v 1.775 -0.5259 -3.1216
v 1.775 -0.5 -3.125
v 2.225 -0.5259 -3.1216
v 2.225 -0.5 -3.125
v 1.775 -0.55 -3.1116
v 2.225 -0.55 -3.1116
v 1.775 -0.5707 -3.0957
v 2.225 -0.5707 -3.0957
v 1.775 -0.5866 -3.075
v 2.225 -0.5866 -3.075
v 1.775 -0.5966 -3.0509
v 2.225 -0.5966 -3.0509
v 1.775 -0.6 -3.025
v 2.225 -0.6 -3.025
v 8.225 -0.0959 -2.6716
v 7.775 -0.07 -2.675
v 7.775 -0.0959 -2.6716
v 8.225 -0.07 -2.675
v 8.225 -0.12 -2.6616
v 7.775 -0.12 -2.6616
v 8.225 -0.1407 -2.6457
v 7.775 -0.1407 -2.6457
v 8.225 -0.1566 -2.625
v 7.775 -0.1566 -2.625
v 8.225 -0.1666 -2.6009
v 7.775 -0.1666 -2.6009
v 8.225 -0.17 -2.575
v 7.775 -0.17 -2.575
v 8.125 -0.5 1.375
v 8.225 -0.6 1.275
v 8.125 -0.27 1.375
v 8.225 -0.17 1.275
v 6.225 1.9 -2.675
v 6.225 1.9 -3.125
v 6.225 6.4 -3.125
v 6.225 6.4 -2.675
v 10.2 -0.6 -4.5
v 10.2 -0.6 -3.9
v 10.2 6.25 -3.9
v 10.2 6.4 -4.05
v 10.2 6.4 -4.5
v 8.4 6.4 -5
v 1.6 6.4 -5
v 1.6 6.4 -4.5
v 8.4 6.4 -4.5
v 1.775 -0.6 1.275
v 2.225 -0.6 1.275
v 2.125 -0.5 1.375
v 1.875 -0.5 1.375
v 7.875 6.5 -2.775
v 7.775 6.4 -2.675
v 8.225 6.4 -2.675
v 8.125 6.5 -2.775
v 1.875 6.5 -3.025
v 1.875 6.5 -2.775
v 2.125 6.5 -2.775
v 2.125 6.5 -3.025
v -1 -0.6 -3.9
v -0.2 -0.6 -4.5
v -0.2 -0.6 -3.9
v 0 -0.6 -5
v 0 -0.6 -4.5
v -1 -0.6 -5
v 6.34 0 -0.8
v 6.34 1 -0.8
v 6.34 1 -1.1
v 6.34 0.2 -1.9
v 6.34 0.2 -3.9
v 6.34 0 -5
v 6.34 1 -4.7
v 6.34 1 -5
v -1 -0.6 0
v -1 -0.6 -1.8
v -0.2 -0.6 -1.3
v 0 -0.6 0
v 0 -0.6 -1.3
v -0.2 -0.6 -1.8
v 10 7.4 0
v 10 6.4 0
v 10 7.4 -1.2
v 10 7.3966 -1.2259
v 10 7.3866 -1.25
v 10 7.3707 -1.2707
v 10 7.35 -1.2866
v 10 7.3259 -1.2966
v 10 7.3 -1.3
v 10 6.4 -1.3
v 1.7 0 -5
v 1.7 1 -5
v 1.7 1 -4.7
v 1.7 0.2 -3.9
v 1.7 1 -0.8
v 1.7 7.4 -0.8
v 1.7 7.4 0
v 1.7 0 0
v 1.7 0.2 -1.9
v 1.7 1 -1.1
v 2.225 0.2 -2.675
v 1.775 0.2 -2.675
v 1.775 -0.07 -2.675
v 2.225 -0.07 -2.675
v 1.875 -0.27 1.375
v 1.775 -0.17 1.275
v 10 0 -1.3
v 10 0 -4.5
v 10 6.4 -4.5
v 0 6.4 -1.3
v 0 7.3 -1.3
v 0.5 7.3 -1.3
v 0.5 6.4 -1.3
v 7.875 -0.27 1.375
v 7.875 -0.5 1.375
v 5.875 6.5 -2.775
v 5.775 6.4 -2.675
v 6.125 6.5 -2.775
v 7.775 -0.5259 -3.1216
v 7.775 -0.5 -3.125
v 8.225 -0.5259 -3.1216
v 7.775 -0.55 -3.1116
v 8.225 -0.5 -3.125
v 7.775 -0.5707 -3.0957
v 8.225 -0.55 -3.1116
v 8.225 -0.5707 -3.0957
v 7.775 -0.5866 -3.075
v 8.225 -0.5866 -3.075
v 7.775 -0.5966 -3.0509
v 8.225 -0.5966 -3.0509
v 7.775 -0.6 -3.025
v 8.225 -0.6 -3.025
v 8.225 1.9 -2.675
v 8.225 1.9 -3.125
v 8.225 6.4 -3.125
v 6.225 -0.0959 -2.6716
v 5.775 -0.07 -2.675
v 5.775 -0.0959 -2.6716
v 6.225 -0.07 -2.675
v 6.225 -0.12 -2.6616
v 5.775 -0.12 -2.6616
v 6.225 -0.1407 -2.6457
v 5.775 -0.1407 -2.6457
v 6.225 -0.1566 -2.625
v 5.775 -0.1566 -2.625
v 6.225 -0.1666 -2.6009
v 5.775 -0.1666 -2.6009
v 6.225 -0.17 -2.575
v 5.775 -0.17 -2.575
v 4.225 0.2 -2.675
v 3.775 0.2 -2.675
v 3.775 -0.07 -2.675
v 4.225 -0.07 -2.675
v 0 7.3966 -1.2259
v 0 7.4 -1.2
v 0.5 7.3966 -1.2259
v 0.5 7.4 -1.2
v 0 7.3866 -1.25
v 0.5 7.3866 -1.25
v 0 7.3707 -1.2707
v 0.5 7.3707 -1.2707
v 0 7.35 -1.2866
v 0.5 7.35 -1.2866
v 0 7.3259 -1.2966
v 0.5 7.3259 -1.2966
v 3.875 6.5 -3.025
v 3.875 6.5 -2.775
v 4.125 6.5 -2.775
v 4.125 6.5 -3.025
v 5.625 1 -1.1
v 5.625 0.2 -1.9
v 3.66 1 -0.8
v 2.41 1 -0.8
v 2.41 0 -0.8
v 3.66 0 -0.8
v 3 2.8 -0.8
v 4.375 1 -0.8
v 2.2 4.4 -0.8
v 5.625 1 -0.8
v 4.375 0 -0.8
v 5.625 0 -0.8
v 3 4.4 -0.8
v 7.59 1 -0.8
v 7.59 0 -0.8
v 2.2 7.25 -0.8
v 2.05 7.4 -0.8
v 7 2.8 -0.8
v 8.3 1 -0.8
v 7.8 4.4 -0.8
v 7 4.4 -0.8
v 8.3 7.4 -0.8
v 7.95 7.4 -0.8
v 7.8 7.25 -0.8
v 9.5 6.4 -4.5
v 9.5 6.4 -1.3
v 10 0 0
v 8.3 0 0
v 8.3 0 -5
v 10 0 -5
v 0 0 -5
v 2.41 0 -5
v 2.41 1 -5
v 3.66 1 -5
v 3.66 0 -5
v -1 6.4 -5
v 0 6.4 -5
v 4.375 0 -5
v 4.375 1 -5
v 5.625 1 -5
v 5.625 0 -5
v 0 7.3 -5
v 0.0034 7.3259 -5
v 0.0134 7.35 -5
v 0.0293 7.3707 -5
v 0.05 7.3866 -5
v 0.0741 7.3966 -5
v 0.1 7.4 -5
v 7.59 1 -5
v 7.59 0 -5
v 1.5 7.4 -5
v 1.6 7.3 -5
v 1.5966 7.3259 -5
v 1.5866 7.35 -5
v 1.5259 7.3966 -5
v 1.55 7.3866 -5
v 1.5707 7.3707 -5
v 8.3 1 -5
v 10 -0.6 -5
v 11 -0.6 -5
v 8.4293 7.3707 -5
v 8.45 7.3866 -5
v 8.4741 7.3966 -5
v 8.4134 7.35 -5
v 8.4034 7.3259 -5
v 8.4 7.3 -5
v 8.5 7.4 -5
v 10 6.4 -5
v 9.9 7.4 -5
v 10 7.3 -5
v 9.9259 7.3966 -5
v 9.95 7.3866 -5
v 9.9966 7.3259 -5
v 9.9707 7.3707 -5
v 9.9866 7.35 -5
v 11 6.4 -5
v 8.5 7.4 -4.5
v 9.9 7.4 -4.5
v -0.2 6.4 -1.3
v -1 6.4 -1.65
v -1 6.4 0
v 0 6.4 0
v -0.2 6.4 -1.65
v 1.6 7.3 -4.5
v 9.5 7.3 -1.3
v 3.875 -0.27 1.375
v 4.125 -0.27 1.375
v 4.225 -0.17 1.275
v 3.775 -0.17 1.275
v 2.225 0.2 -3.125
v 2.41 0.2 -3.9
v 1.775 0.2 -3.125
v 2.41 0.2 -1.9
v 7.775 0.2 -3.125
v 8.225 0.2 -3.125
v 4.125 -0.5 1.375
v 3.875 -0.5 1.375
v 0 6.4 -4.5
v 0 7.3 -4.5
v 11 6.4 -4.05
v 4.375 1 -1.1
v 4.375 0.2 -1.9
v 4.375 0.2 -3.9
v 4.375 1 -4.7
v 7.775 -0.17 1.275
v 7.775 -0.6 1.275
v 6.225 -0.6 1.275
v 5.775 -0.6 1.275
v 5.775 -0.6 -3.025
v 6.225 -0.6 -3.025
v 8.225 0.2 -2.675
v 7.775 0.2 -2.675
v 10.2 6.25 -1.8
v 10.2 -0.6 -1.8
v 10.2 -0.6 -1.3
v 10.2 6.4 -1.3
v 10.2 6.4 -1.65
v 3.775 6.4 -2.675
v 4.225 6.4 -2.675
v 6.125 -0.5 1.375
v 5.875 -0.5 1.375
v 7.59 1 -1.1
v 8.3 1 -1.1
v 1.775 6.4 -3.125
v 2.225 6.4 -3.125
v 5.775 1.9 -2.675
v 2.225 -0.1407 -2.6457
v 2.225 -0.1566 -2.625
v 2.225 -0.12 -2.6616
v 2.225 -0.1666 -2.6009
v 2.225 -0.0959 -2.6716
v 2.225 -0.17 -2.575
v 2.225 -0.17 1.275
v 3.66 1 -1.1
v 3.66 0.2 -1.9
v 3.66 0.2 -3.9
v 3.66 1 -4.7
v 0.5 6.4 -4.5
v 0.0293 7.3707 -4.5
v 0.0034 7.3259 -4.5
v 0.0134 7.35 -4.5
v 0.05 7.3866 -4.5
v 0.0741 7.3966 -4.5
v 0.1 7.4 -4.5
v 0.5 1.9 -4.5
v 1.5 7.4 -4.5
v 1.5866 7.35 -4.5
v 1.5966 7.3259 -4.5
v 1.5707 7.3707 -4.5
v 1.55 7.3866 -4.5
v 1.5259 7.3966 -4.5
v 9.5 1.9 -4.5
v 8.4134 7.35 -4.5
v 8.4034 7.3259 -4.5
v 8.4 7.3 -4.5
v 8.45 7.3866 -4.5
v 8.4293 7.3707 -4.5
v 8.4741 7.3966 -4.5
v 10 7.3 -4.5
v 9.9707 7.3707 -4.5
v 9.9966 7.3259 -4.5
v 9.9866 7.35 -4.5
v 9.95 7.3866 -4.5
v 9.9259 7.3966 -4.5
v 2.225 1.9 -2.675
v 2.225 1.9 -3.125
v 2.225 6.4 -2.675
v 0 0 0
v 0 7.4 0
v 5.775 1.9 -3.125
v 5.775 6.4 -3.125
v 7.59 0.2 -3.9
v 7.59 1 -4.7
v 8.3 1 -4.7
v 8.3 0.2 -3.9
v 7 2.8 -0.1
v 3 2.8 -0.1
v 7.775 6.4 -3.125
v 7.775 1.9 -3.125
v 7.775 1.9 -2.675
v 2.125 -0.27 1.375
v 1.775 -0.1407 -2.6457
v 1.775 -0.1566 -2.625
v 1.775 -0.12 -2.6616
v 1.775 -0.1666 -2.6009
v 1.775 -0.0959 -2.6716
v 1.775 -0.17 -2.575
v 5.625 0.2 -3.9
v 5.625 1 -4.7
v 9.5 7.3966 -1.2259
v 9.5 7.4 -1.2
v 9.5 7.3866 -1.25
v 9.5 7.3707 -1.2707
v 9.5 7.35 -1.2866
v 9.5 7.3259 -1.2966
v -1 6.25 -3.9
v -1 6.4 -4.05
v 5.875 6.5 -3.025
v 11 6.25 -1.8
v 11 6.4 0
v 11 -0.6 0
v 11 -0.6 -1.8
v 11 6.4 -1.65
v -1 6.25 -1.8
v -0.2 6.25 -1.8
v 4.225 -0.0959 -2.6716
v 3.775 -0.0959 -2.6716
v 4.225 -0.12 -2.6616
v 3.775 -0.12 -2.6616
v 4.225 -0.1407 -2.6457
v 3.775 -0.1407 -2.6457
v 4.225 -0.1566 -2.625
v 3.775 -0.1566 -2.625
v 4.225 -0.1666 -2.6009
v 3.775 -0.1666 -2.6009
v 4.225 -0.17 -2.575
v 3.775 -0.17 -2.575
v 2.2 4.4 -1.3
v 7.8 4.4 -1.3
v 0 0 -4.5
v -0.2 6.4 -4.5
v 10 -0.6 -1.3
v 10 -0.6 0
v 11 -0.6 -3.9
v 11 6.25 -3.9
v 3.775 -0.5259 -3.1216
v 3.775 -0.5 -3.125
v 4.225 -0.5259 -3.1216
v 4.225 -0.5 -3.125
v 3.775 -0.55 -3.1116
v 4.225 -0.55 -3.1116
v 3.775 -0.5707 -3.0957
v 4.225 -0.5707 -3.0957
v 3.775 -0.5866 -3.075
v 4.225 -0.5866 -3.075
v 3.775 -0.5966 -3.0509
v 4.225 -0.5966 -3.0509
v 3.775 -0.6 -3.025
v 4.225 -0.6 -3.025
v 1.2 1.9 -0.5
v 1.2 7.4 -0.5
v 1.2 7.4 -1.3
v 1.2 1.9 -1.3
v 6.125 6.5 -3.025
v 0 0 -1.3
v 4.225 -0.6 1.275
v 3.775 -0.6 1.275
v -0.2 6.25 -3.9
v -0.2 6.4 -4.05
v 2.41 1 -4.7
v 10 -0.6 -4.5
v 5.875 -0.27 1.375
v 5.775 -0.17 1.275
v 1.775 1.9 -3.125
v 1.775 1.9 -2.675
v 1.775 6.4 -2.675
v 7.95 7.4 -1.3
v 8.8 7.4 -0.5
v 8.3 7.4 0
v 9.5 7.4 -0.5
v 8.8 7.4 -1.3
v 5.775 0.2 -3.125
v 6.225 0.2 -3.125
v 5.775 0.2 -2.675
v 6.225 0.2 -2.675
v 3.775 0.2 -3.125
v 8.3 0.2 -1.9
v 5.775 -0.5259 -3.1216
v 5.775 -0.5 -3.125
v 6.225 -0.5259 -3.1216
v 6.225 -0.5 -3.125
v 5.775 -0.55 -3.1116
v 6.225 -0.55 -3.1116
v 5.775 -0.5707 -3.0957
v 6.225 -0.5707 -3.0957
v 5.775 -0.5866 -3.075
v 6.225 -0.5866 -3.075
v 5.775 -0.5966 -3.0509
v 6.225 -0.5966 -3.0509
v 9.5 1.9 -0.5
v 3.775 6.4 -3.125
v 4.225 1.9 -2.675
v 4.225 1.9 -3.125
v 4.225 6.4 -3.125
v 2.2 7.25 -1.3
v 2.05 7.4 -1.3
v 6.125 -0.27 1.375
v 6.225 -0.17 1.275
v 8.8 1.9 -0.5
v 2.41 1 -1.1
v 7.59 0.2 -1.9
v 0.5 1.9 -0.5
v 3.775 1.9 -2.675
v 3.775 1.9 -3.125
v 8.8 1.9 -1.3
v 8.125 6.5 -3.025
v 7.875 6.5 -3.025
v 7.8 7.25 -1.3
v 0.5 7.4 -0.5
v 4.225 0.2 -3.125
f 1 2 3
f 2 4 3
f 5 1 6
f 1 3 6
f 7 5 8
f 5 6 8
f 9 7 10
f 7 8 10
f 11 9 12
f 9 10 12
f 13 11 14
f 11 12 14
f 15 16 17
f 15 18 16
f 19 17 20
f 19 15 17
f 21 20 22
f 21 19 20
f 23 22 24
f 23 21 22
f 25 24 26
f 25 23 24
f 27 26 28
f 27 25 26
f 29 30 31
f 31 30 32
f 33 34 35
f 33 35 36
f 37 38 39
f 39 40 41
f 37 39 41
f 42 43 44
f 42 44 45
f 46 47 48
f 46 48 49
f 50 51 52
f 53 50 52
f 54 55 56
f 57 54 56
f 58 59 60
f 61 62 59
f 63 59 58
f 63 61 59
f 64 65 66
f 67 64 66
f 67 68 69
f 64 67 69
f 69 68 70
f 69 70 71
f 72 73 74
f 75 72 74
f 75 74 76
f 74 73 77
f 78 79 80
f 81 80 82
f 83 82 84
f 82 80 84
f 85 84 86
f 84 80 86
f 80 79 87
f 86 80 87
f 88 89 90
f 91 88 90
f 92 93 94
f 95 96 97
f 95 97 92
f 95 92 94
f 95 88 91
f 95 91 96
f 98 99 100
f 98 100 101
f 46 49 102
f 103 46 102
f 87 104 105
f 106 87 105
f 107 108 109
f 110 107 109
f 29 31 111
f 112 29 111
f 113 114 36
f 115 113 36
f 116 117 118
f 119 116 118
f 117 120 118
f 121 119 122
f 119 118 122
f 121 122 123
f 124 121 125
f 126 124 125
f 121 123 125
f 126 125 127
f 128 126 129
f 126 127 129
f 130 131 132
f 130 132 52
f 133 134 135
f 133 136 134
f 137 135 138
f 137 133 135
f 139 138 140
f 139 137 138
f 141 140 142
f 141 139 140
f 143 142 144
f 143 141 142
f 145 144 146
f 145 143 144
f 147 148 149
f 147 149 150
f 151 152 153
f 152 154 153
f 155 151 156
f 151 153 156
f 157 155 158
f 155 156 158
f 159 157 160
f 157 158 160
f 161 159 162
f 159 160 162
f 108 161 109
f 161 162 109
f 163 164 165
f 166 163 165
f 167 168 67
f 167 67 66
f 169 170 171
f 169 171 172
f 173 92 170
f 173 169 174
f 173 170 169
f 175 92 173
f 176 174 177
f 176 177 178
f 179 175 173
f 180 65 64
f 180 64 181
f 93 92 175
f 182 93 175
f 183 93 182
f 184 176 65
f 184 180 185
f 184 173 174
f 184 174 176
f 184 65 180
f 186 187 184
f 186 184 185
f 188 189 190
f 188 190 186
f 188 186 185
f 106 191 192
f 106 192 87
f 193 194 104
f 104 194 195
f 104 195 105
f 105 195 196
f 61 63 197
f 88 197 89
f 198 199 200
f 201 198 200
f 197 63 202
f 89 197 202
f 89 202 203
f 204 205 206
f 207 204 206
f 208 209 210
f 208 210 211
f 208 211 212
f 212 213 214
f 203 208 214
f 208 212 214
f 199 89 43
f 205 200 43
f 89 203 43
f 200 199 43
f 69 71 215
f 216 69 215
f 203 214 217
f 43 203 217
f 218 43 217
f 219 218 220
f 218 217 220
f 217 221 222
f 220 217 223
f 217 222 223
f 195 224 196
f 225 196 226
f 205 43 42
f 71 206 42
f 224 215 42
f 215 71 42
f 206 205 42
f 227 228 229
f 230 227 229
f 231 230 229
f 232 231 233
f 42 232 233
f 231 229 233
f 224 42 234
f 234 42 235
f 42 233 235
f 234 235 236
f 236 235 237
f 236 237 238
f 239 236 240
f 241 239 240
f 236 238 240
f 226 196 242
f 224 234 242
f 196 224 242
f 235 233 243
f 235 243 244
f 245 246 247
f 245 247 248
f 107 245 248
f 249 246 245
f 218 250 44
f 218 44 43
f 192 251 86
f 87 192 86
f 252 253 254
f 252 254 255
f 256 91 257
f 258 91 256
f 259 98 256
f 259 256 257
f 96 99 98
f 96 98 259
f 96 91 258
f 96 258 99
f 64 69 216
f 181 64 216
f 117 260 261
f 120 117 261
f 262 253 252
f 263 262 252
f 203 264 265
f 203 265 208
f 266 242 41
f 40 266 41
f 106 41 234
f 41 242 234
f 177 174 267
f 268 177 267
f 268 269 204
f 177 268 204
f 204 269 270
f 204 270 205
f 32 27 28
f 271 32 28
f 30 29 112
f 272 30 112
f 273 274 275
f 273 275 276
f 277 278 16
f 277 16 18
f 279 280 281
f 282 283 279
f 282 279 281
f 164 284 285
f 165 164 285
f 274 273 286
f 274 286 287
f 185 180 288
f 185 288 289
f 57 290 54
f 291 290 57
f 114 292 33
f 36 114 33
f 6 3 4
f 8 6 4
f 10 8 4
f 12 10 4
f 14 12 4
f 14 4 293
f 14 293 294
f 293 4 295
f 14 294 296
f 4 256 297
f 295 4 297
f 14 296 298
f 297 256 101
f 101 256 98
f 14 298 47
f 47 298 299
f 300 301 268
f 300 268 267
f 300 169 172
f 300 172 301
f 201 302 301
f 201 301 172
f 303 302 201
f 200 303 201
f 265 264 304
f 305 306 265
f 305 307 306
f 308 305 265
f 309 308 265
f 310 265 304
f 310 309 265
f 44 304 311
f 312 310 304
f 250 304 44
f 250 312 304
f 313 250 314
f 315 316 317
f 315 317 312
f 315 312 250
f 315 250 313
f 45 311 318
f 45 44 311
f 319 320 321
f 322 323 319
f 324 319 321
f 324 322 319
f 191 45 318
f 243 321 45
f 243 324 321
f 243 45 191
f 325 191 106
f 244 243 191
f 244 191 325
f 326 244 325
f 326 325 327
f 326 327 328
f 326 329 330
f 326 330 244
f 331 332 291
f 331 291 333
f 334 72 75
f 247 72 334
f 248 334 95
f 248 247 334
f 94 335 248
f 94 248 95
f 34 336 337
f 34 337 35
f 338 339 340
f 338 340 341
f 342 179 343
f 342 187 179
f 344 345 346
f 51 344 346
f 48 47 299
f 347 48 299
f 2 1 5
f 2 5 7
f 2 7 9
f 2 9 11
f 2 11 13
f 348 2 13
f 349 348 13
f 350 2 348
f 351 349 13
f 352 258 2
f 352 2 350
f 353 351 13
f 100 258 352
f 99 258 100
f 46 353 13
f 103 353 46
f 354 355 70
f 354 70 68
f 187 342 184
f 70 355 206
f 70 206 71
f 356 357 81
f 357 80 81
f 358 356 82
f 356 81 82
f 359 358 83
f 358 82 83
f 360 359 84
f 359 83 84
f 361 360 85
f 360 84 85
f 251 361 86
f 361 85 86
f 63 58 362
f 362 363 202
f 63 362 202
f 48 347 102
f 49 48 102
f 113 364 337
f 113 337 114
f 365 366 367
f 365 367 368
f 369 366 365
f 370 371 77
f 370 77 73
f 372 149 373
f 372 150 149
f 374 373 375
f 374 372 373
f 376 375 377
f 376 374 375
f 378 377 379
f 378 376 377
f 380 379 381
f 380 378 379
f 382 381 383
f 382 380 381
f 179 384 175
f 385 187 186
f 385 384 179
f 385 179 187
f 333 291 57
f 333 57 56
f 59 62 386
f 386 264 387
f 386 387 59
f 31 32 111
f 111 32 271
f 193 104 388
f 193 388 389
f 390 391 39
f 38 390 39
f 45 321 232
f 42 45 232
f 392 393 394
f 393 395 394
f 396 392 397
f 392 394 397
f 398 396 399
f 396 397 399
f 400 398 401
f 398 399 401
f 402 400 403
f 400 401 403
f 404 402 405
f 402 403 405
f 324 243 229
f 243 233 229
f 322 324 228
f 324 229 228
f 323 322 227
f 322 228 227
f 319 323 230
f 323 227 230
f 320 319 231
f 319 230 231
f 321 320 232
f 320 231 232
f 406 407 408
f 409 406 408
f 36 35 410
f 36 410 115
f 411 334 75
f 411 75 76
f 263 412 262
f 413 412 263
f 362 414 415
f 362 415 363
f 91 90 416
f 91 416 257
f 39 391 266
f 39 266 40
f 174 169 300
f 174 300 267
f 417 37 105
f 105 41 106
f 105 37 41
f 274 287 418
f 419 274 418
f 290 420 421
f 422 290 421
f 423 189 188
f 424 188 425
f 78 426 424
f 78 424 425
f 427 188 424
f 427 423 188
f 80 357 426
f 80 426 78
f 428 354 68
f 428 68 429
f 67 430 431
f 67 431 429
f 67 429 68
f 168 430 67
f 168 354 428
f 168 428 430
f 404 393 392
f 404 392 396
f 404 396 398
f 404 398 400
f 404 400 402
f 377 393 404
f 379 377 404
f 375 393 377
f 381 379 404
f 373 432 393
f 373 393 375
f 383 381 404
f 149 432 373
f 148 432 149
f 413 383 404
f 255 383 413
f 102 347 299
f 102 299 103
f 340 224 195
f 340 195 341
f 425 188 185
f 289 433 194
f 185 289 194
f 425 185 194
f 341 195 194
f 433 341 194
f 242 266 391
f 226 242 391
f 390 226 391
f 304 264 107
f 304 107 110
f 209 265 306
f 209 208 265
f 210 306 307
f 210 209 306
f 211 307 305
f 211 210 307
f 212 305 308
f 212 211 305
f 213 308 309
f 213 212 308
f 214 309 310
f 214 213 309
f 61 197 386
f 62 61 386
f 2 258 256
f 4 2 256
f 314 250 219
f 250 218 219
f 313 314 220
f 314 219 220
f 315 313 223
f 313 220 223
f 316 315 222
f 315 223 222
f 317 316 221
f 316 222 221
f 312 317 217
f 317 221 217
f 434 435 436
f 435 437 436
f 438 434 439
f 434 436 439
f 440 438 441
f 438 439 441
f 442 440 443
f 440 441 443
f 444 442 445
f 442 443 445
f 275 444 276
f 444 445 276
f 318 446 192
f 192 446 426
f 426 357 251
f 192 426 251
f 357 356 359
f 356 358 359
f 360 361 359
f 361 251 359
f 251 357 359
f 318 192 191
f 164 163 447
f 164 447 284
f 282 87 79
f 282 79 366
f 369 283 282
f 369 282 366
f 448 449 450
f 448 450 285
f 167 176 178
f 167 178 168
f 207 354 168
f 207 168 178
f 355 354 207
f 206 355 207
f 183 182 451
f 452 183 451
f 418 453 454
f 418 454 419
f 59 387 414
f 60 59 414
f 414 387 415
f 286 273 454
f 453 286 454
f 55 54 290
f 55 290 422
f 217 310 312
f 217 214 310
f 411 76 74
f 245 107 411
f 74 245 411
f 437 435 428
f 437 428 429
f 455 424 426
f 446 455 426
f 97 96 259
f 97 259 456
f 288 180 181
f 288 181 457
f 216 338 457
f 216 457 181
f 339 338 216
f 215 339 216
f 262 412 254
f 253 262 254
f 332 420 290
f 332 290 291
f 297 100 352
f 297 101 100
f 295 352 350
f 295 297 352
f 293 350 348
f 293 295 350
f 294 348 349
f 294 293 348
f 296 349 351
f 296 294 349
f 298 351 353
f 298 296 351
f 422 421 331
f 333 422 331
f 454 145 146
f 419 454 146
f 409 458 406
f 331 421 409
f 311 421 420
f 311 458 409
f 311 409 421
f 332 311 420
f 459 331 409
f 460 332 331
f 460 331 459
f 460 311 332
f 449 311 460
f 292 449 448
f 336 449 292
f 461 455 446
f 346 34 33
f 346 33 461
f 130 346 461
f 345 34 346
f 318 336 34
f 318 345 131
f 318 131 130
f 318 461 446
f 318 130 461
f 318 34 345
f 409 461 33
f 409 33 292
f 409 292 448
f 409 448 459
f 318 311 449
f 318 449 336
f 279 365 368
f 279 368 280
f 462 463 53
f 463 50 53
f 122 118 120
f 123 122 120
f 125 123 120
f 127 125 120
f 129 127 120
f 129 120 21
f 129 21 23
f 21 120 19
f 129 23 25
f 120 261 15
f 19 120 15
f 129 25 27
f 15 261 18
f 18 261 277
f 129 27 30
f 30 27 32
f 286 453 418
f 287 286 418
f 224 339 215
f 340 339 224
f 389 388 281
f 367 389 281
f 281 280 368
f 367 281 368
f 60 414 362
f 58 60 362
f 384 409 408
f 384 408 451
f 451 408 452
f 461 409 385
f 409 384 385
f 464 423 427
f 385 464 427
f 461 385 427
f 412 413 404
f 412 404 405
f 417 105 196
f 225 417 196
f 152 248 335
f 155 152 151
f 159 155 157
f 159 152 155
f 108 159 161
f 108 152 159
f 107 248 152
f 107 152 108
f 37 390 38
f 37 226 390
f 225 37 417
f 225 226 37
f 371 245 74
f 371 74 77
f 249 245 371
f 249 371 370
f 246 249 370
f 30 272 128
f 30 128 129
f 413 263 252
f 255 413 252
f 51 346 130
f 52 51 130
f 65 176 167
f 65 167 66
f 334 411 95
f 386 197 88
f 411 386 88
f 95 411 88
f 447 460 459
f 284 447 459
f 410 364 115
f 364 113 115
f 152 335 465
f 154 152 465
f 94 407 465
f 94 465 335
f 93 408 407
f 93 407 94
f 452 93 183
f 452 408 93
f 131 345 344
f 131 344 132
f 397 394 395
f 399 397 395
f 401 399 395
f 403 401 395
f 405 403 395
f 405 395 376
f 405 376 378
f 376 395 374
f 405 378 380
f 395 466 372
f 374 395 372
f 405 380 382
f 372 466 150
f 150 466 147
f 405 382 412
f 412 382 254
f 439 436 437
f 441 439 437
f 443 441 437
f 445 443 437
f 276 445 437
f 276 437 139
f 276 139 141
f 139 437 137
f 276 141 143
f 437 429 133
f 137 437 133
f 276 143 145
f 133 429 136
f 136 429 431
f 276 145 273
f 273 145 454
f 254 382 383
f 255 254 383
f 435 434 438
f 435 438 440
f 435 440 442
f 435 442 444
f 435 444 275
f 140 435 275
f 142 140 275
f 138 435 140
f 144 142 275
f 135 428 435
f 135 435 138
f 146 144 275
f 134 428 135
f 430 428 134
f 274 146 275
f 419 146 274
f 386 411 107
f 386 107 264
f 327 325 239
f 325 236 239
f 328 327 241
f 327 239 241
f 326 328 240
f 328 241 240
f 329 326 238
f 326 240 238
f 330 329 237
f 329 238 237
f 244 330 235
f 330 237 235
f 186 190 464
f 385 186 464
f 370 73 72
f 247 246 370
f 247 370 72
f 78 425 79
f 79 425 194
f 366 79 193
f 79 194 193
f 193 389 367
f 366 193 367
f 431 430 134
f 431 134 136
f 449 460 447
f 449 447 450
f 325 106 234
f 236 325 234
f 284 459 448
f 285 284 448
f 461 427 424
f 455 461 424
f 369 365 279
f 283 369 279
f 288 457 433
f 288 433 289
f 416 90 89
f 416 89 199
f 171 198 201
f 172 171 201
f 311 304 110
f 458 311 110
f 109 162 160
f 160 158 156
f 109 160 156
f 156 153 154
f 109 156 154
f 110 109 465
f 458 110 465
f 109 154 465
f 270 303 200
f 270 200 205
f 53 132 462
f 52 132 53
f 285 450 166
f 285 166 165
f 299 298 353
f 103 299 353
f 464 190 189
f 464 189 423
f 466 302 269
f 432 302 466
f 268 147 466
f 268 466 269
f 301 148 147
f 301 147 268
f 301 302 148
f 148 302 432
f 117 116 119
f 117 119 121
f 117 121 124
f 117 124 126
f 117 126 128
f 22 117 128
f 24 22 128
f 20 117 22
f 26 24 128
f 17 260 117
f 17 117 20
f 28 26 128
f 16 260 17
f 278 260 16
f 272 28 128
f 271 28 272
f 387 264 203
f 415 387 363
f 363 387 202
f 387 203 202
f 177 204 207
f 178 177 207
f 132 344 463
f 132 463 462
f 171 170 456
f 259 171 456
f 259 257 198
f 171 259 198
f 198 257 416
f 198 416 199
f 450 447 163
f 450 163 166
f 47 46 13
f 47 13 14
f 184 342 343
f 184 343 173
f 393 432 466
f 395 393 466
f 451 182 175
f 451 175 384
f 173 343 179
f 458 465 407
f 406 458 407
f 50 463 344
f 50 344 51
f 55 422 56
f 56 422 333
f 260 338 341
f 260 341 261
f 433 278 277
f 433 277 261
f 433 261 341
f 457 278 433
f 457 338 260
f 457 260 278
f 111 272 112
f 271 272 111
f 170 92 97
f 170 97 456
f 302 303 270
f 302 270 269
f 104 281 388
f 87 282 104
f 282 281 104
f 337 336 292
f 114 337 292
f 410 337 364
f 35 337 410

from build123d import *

# Parameters (mm, degrees)
ESQUISSE1_W             = 10
ESQUISSE1_H             = 5
BOSS_EXTRU_1_DEPTH      = 7.4
ESQUISSE2_W             = 6.6
ESQUISSE2_H             = 0.8
ENL_V_MAT_EXTRU_1_DEPTH = 8
ENL_V_MAT_EXTRU_2_DEPTH = 5.5
ESQUISSE5_W             = 6.8
ESQUISSE5_H             = 0.5
ESQUISSE5_W_2           = 0.5
ESQUISSE5_H_2           = 3.2
ENL_V_MAT_EXTRU_3_DEPTH = 1
ESQUISSE6_W             = 5.6
ESQUISSE6_H             = 0.5
ENL_V_MAT_EXTRU_4_DEPTH = 3
ESQUISSE8_W             = 6.6
ESQUISSE8_H             = 4.2
ENL_V_MAT_EXTRU_6_DEPTH = 1
BOSS_EXTRU_2_DEPTH      = 6.8
BOSS_EXTRU_3_DEPTH      = 2
BOSS_EXTRU_3_DEPTH_BACK = 2
ESQUISSE17_W            = 1.25
ESQUISSE17_H            = 4.2
BOSS_EXTRU_8_DEPTH      = 1
CHANFREIN1_SIZE         = 0.15
ESQUISSE13_W            = 0.45
ESQUISSE13_H            = 0.45
BOSS_EXTRU_5_DEPTH      = 0.8
BOSS_EXTRU_5_DEPTH_BACK = 6.3
CONG_2_R                = 0.1
ESQUISSE14_W            = 0.45
ESQUISSE14_H            = 0.43
BOSS_EXTRU_6_DEPTH      = 4.5
CHANFREIN2_SIZE         = 0.1
BOSS_EXTRU_7_DEPTH      = 7
CHANFREIN4_SIZE         = 0.15
CONG_3_R                = 0.1


with BuildPart() as part:
    # Esquisse1 → Boss.-Extru.1 (new body)
    with BuildSketch(Plane(origin=(0, 0, 0), x_dir=(1, 0, 0), z_dir=(0, 1, 0))):
        with Locations((5, 2.5)):
            Rectangle(ESQUISSE1_W, ESQUISSE1_H)
    extrude(amount=BOSS_EXTRU_1_DEPTH)

    # Esquisse2 → Enlèv. mat.-Extru.1 (cut)
    with BuildSketch(Plane(origin=(0, 7.4, 0), x_dir=(1, 0, 0), z_dir=(0, 1, 0))):
        with Locations((5, 0.4)):
            Rectangle(ESQUISSE2_W, ESQUISSE2_H)
    extrude(amount=-ENL_V_MAT_EXTRU_1_DEPTH, mode=Mode.SUBTRACT)

    # Esquisse4 → Enlèv. mat.-Extru.2 (cut)
    with BuildSketch(Plane(origin=(0, 7.4, 0), x_dir=(1, 0, 0), z_dir=(0, 1, 0))):
        Polygon((0.5, 0.5), (1.2, 0.5), (1.2, 1.3), (8.8, 1.3), (8.8, 0.5), (9.5, 0.5), (9.5, 4.5), (0.5, 4.5), align=None)
    extrude(amount=-ENL_V_MAT_EXTRU_2_DEPTH, mode=Mode.SUBTRACT)

    # Esquisse5 → Enlèv. mat.-Extru.3 (cut)
    with BuildSketch(Plane(origin=(0, 7.4, 0), x_dir=(1, 0, 0), z_dir=(0, 1, 0))):
        with Locations((5, 4.75)):
            Rectangle(ESQUISSE5_W, ESQUISSE5_H)
        with Locations((0.25, 2.9)):
            Rectangle(ESQUISSE5_W_2, ESQUISSE5_H_2)
        with Locations((9.75, 2.9)):
            Rectangle(ESQUISSE5_W_2, ESQUISSE5_H_2)
    extrude(amount=-ENL_V_MAT_EXTRU_3_DEPTH, mode=Mode.SUBTRACT)

    # Esquisse6 → Enlèv. mat.-Extru.4 (cut)
    with BuildSketch(Plane(origin=(0, 7.4, 0), x_dir=(1, 0, 0), z_dir=(0, 1, 0))):
        with Locations((5, 1.05)):
            Rectangle(ESQUISSE6_W, ESQUISSE6_H)
    extrude(amount=-ENL_V_MAT_EXTRU_4_DEPTH, mode=Mode.SUBTRACT)

    # Esquisse8 → Enlèv. mat.-Extru.6 (cut)
    with BuildSketch(Plane.XZ):
        with Locations((5, -2.9)):
            Rectangle(ESQUISSE8_W, ESQUISSE8_H)
    extrude(amount=-ENL_V_MAT_EXTRU_6_DEPTH, mode=Mode.SUBTRACT)

    # Esquisse9 → Boss.-Extru.2 (add)
    with BuildSketch(Plane(origin=(1.7, 0, 0), x_dir=(0, 0, -1), z_dir=(1, 0, 0))):
        Polygon((4.7, 1), (3.9, 0.2), (1.9, 0.2), (1.1, 1), align=None)
    extrude(amount=BOSS_EXTRU_2_DEPTH)

    # Esquisse11 → Boss.-Extru.3 (add, two sides)
    with BuildSketch(Plane(origin=(5, 0, 0), x_dir=(0, 0, -1), z_dir=(1, 0, 0))) as boss_extru_3_sk:
        Polygon((0.8, 4.4), (0.1, 2.8), (0.8, 2.8), align=None)
    extrude(amount=BOSS_EXTRU_3_DEPTH)
    extrude(boss_extru_3_sk.sketch, amount=-BOSS_EXTRU_3_DEPTH_BACK)

    # Esquisse17 → Boss.-Extru.8 (add)
    with BuildSketch(Plane(origin=(0, 1, 0), x_dir=(1, 0, 0), z_dir=(0, 1, 0))):
        with Locations((3.035, 2.9)):
            Rectangle(ESQUISSE17_W, ESQUISSE17_H)
        with Locations((5, 2.9)):
            Rectangle(ESQUISSE17_W, ESQUISSE17_H)
        with Locations((6.965, 2.9)):
            Rectangle(ESQUISSE17_W, ESQUISSE17_H)
    extrude(amount=-BOSS_EXTRU_8_DEPTH)

    # Chanfrein1
    chanfrein1_edges = [part.edges().sort_by_distance(p)[0] for p in [
        (2.2, 7.4, -1.05),
        (7.8, 7.4, -1.05),
    ]]
    chamfer(chanfrein1_edges, length=CHANFREIN1_SIZE)

    # Esquisse13 → Boss.-Extru.5 (add, two sides)
    with BuildSketch(Plane.XZ.offset(-0.2)) as boss_extru_5_sk:
        with Locations((8, -2.9)):
            Rectangle(ESQUISSE13_W, ESQUISSE13_H)
        with Locations((4, -2.9)):
            Rectangle(ESQUISSE13_W, ESQUISSE13_H)
        with Locations((2, -2.9)):
            Rectangle(ESQUISSE13_W, ESQUISSE13_H)
        with Locations((6, -2.9)):
            Rectangle(ESQUISSE13_W, ESQUISSE13_H)
    extrude(amount=BOSS_EXTRU_5_DEPTH)
    extrude(boss_extru_5_sk.sketch, amount=-BOSS_EXTRU_5_DEPTH_BACK)

    # Congé2
    cong_2_edges = [part.edges().sort_by_distance(p)[0] for p in [
        (0.25, 7.4, -1.3),
        (0, 7.4, -4.75),
        (1.6, 7.4, -4.75),
        (8.4, 7.4, -4.75),
        (10, 7.4, -4.75),
        (9.75, 7.4, -1.3),
    ]]
    fillet(cong_2_edges, radius=CONG_2_R)

    # Esquisse14 → Boss.-Extru.6 (add)
    with BuildSketch(Plane(origin=(0, 0, -3.125), x_dir=(-1, 0, 0), z_dir=(0, 0, -1))):
        with Locations((-8, -0.385)):
            Rectangle(ESQUISSE14_W, ESQUISSE14_H)
        with Locations((-6, -0.385)):
            Rectangle(ESQUISSE14_W, ESQUISSE14_H)
        with Locations((-4, -0.385)):
            Rectangle(ESQUISSE14_W, ESQUISSE14_H)
        with Locations((-2, -0.385)):
            Rectangle(ESQUISSE14_W, ESQUISSE14_H)
    extrude(amount=-BOSS_EXTRU_6_DEPTH)

    # Chanfrein2
    chanfrein2_edges = [part.edges().sort_by_distance(p)[0] for p in [
        (4.225, 6.5, -2.9),
        (4, 6.5, -3.125),
        (3.775, 6.5, -2.9),
        (4, 6.5, -2.675),
        (2.225, 6.5, -2.9),
        (2, 6.5, -3.125),
        (1.775, 6.5, -2.9),
        (2, 6.5, -2.675),
        (8, 6.5, -3.125),
        (7.775, 6.5, -2.9),
        (8, 6.5, -2.675),
        (8.225, 6.5, -2.9),
        (6, 6.5, -3.125),
        (5.775, 6.5, -2.9),
        (6, 6.5, -2.675),
        (6.225, 6.5, -2.9),
        (8.225, -0.385, 1.375),
        (8, -0.17, 1.375),
        (7.775, -0.385, 1.375),
        (8, -0.6, 1.375),
        (6.225, -0.385, 1.375),
        (6, -0.17, 1.375),
        (5.775, -0.385, 1.375),
        (6, -0.6, 1.375),
        (4.225, -0.385, 1.375),
        (4, -0.17, 1.375),
        (3.775, -0.385, 1.375),
        (4, -0.6, 1.375),
        (2.225, -0.385, 1.375),
        (2, -0.17, 1.375),
        (1.775, -0.385, 1.375),
        (2, -0.6, 1.375),
    ]]
    chamfer(chanfrein2_edges, length=CHANFREIN2_SIZE)

    # Esquisse16 → Boss.-Extru.7 (add)
    with BuildSketch(Plane(origin=(0, 6.4, 0), x_dir=(1, 0, 0), z_dir=(0, 1, 0))):
        Polygon((0, 1.3), (-0.2, 1.3), (-0.2, 1.8), (-1, 1.8), (-1, 1.3), (-1, 0), (0, 0), align=None)
        Polygon((-0.2, 4.5), (-0.2, 3.9), (-1, 3.9), (-1, 5), (-0.2, 5), (0, 5), (0, 4.5), align=None)
        Polygon((11, 3.9), (10.2, 3.9), (10.2, 4.5), (10, 4.5), (10, 5), (10.2, 5), (11, 5), align=None)
        Polygon((11, 1.3), (11, 1.8), (10.2, 1.8), (10.2, 1.3), (10, 1.3), (10, 0), (11, 0), align=None)
    extrude(amount=-BOSS_EXTRU_7_DEPTH)

    # Chanfrein4
    chanfrein4_edges = [part.edges().sort_by_distance(p)[0] for p in [
        (-0.6, 6.4, -1.8),
        (-0.6, 6.4, -3.9),
        (10.6, 6.4, -3.9),
        (10.6, 6.4, -1.8),
    ]]
    chamfer(chanfrein4_edges, length=CHANFREIN4_SIZE)

    # Congé3
    cong_3_edges = [part.edges().sort_by_distance(p)[0] for p in [
        (4, -0.6, -3.125),
        (2, -0.6, -3.125),
        (8, -0.6, -3.125),
        (6, -0.6, -3.125),
        (8, -0.17, -2.675),
        (6, -0.17, -2.675),
        (4, -0.17, -2.675),
        (2, -0.17, -2.675),
    ]]
    fillet(cong_3_edges, radius=CONG_3_R)


solid = part.part
